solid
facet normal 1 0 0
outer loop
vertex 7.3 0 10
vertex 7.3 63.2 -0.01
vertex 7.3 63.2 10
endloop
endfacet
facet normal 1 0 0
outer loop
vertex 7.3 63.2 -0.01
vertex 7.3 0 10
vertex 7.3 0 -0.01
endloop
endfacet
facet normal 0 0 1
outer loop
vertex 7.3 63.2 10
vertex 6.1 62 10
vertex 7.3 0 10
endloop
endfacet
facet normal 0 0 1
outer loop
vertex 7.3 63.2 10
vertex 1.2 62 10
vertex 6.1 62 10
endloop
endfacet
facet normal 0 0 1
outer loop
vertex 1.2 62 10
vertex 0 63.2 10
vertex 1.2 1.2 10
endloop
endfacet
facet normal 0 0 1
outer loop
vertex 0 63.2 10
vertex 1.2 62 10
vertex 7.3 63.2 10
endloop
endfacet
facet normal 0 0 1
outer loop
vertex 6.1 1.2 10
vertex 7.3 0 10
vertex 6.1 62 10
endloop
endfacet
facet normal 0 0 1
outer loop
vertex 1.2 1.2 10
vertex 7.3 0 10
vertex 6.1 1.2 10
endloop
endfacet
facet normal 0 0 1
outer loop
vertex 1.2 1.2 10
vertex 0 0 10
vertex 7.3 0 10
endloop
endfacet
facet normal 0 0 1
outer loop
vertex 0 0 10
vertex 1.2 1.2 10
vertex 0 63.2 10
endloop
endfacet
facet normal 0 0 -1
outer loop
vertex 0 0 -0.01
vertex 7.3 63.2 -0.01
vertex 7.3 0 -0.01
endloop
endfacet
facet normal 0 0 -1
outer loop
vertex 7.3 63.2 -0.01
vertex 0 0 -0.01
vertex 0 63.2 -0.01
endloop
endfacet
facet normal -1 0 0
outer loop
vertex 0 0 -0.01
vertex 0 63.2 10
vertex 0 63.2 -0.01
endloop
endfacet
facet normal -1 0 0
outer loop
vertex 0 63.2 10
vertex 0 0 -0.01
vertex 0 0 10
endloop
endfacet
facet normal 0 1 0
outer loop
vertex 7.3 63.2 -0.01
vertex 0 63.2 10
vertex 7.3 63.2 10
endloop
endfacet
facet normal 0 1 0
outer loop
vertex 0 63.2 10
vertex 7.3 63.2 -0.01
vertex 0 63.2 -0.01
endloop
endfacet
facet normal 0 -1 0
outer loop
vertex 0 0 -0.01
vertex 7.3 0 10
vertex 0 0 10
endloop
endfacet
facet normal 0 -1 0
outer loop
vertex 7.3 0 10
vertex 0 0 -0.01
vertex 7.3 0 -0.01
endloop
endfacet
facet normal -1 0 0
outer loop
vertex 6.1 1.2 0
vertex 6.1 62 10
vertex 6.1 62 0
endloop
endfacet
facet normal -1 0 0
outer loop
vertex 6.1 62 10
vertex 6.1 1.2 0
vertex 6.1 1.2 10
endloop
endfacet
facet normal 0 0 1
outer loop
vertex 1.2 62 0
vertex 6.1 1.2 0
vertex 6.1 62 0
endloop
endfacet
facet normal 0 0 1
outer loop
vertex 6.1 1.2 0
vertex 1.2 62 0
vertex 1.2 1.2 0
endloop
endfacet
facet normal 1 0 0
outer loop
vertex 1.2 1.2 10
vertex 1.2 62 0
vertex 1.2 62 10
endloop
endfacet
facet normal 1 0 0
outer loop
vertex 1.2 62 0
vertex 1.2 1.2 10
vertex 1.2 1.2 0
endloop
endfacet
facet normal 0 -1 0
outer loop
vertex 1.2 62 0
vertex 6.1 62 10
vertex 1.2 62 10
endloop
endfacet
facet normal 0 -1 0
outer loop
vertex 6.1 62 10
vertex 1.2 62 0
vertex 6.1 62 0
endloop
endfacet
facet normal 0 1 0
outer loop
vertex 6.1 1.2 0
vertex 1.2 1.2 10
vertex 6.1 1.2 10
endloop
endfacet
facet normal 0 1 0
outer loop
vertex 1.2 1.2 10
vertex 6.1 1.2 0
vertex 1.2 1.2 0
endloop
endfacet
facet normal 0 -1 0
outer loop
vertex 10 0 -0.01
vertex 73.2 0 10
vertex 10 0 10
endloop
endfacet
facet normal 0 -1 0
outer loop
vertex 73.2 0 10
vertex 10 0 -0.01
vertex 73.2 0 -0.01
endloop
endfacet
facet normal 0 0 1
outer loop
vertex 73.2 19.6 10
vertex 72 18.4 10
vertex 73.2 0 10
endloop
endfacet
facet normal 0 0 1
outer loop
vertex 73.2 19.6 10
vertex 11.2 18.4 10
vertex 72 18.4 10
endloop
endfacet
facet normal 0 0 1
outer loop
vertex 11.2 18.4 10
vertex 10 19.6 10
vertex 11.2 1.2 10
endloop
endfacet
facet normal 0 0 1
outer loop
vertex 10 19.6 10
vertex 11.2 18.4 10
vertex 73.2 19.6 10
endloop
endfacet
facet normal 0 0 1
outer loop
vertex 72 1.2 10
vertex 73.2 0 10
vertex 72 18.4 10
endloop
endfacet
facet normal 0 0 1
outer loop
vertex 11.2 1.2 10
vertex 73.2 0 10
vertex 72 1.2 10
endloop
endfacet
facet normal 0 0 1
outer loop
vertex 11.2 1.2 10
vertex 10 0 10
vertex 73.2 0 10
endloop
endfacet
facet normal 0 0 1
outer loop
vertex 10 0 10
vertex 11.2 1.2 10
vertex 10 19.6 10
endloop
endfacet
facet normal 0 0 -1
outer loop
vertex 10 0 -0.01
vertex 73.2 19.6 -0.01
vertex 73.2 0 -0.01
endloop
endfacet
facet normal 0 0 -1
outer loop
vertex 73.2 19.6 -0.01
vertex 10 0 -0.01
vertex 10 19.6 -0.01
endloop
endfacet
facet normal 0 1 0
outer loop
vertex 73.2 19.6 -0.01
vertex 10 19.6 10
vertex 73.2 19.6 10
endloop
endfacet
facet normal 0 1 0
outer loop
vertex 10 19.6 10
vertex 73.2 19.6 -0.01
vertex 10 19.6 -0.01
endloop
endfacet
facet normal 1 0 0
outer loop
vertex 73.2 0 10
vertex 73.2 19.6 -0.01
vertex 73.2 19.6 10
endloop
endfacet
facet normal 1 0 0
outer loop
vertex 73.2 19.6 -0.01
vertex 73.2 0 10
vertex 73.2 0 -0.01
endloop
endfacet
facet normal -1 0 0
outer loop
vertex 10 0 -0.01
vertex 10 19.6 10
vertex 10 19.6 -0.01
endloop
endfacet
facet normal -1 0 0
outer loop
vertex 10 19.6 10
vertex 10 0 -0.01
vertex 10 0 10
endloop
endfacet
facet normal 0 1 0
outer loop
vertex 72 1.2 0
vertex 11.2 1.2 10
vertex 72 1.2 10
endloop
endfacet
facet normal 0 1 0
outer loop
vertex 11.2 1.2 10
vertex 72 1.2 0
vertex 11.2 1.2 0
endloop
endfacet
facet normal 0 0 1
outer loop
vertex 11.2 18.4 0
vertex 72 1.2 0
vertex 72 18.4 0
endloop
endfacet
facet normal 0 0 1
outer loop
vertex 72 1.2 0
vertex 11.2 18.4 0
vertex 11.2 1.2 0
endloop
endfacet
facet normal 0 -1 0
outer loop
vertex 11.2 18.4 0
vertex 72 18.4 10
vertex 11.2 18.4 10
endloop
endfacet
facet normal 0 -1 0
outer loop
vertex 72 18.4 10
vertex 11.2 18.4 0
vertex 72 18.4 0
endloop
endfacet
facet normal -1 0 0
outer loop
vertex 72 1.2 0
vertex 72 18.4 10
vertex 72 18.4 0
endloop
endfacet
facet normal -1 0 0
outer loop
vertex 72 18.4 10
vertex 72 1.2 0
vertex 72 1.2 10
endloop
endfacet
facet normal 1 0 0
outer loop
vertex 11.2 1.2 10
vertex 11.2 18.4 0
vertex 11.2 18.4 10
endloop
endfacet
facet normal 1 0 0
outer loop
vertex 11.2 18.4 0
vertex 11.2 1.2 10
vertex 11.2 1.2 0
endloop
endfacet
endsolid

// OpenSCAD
// file: ../../Base/Boxes.scad
// Fischertechnik Box Foundation
// Pre-designed Boxes

use <Constants.scad>

include <PlacementOptions.scad>

box190Width = 190;
box190Depth = 130;
box130Width = 130;
box130Depth = 95;
boxUsageHeight = 33.9;
boxWallThickness = 2.4;
boxBaseThickness = 1.0;

// getBoxWallThickness()
// Gets the wall thickness of a Fischertechnik Box

function getBoxWallThickness() = boxWallThickness;

// Gets the usable height of a fischertechnik box
function getBoxUsageHeight() = boxUsageHeight;

// Gets the thickness of the Fischertechnik box base.
function getBoxBaseThickness() = boxBaseThickness;

// Gets the usable inner space of a Box 190 as an x/y-list
function getBox190Space() = [
    box190Width - 2*getBoxWallThickness(), 
    box190Depth - 2*getBoxWallThickness() ];

// Imports the Fischertechnik empty box 130x190 mm and places it at position 0,0
// 190x130 are the outer sizes, the inner space is slightly smaller. Use getBox190Space() to get the inner sizes.
// This module needs the STL file "Fischertechnik Box 130x190.stl" in the library path.
// The box is positioned that the usable inner space is at the 0,0,0 position. The

module Box190() {
    translate([-getBoxWallThickness(),-getBoxWallThickness(),-getBoxBaseThickness()])
        import("Fischertechnik Box 130x190.stl", convexity=3);
}

// Gets the usable inner space of a Box 130 as an x/y-list
function getBox130Space() = [
    box130Width - 2*getBoxWallThickness(), 
    box130Depth - 2*getBoxWallThickness() ];

// Imports the Fischertechnik empty box 95x130 mm and places it at position 0,0
// 190x130 are the outer sizes, the inner space is slightly smaller. Use getBox190Space() to get the inner sizes.
// This module needs the STL file "Fischertechnik Box 95x130.stl" in the library path.
// The box is positioned that the usable inner space is at the 0,0,0 position. The

module Box130() {
    translate([-getBoxWallThickness(),-getBoxWallThickness(),-getBoxBaseThickness()])
        import("Fischertechnik Box 95x130.stl", convexity=3);
}

// Creates a web at the specified box walls
// corner 0 = LowerLeft, 1 = UpperLeft, 2 = UpperRight, 3 = LowerRight
// side 0 = LeftOfCorner, 1 = RightOfCorner
// distance = Distance in mm from the corner
// box = inner width and depth of the box (default: Box 190)
// webWidth = length of the web (default is 3 mms)
// webThickness = thickness of the web (default is 1 mm)

module BoxWeb(corner, side, distance, box=getBox190Space(), webWidth=3, webThickness=1.0) {
    sink = getBoxWallThickness()/2;

    width = (corner % 2 == 0) ? 
            (side == LeftOfCorner ? webWidth : webThickness) :
            (side == LeftOfCorner ? webThickness : webWidth);

    depth = (corner % 2 == 0) ? 
            (side == RightOfCorner ? webWidth : webThickness) :
            (side == RightOfCorner ? webThickness : webWidth);
    
    xDiff = corner == LowerLeft ? 
                (side == LeftOfCorner ? -sink : distance) :
            (corner == UpperLeft ?                
                (side == LeftOfCorner ? distance : -sink) :
            (corner == UpperRight ?
                (side == LeftOfCorner ? box.x-webWidth+sink : box.x-distance-webThickness) :
                (side == LeftOfCorner ? box.x-distance-webThickness: box.x-webWidth+sink)));

    yDiff = corner == LowerLeft ? 
                (side == RightOfCorner ? -sink : distance) :
            (corner == UpperLeft ?
                (side == RightOfCorner ? box.y-distance : box.y-webWidth+sink) :
            (corner == UpperRight ?
                (side == RightOfCorner ? box.y-webWidth+sink : box.y-distance) :
                (side == RightOfCorner ? distance : -sink)));
    
    translate([xDiff, yDiff, -getExcess()])
        cube([width, depth, boxUsageHeight + 2*getExcess()]);
}
// file: ../../Base/Rotation.scad
// Fischertechnik Box Foundation
// Geometry Helpers Rotation

include <PlacementOptions.scad>

// getRotatedSpace(space, rotation=NoRotation)
// Rotates the space dependent on the specified rotation

function getRotatedSpace(space, rotation=NoRotation) = [
    (rotation == Rotate90 || rotation == Rotate270) ? space.y : space.x,
    (rotation == Rotate90 || rotation == Rotate270) ? space.x : space.y
];

// Rotates the given space around the fixed left lower corner
// space = the space the children needs as width/depth list [width,depth]
// rotation = 0 Rotate0 degrees, 1 Rotate90 degrees, 2 Rotate180 degrees, 3 Rotate270 degrees (equivalent to -90)

module RotateFix(space, rotation=Rotate0) {
    dy = (rotation == Rotate0 || rotation == Rotate270) ? 0 :
        (rotation == Rotate90) ? space.x :
        space.y;
    dx = (rotation < Rotate180) ? 0 :
        (rotation == Rotate180) ? space.x :
        space.y;
    
    translate([dx, dy, 0])
        rotate([0, 0, rotations[rotation]])
            children();
}
// file: ../../Base/Alignment.scad
// Fischertechnik Box Foundation
// Geometry Helpers Alignment

include <PlacementOptions.scad>

// getAlignedX(elementWidth, spaceWidth, align=AlignRight, offset=0)
// Gets the aligned X offset of an element with the given
// width in the given space.
// elementWidth = The width of the element to positon
// spaceWidth = The space where the element should be aligned
// align = 0 AlignLeft, 1 AlignCenter, 2 AlignRight
// offset = an optional offset from the aligned position. When
// aligned left or centered, then positive values are in X direction.
// When aligned right then positive values are in negative X direction.

function getAlignedX(elementWidth, spaceWidth, align=AlignRight, offset=0) =
    (align == AlignLeft) ?
        offset :
        ((align == AlignCenter) ?
        (spaceWidth - elementWidth)/2 + offset :
        spaceWidth - offset - elementWidth);

// getAlignedY(elementDepth, spaceDepth, align=AlignTop, offset=0)
// Gets the aligned Y offset of an element with the given
// depth in the given space.
// elementDepth = The depth of the element to positon
// spaceDepth = The space where the element should be aligned
// align = 0 AlignBottom, 1 AlignCenter, 2 AlignTop
// offset = an optional offset from the aligned position. When
// aligned bottom or centered, then positive values are in Y direction.
// When aligned top then positive values are in negative Y direction.

function getAlignedY(elementDepth, spaceDepth, align=AlignTop, offset=0) =
    (align == AlignBottom) ?
        offset :
        ((align == AlignCenter) ?
        (spaceDepth - elementDepth)/2 + offset :
        spaceDepth - offset - elementDepth);
// file: ../../Base/Constants.scad
// Fischertechnik Box Foundation
// Constants

// Constant values necessary for multiple elements

// Base constants
dividerThickness = 1.2;
excess = 0.01;
fragments = 90;
tolerance = 0.8;

// Gets the thickness of a divider 
function getDividerThickness() = dividerThickness;

// Gets the excess that is used to merge walls into each other
function getExcess() = excess;

// Gets amount of fragments of a cylinder
function getFragments() = fragments;

// Gets the inner tolerance of a frame to each side
function getTolerance() = tolerance;


// Fischertechnik specific constants
axisDiameter = 4;
axisBottomDiameter = axisDiameter + 1;
standardEdgeDistance = 2.5;
standardWebDistance = 11.5;
standardCornerLength = 15;
tubeWallFactor = 1.6;

// Gets axis diameter
function getAxisDiameter() = axisDiameter;

// Gets axis bottom diameter for thicker part at the bottom
function getAxisBottomDiameter() = axisBottomDiameter;

// gets the standard distance to the wall of the box for dockable frames with webs
function getStandardEdgeDistance() = standardEdgeDistance;

// gets the standard distance of each web to the corner of the dockable frame
function getStandardWebDistance() = standardWebDistance;

// gets the standard length of the corner walls of a dockable frame
function getStandardCornerLength() = standardCornerLength;

// gets the wall thickness of a tube.
function getTubeWallThickness() = tubeWallFactor * getDividerThickness();
// file: ../../Base/PlacementOptions.scad
// Fischertechnik Box Foundation
// Placement Options

// Alignment
NoAlign = 0;
AlignLeft = 1;
AlignBottom = 2;
AlignCenter = 3;
AlignRight = 4;
AlignTop = 5;

// Element rotation degree steps
rotations = [0, -90, -180, -270];

// Rotation
NoRotation = 0;
Rotate0 = 0;
Rotate90 = 1;
Rotate180 = 2;
Rotate270 = 3;

// Docking (seen from above)
NoDock = -1;
DockLeft = 0;
DockTop = 1;
DockRight = 2;
DockCorner = 2;
DockBottom = 3;

// Web corners
LowerLeft = 0;
UpperLeft = 1;
UpperRight = 2;
LowerRight = 3;

// Web position relative to corner
LeftOfCorner = 0;
RightOfCorner = 1;
// file: ../../Elements/FrameFlatPiece60.scad
// Fischertechnik Box Library
// Frame for Flat Pieces 60
// 31555

use <../Base/Constants.scad>
use <../ModelBase/Complex.scad>

size = 60;

// getFrameFlatPiece60Space(count)
// count = count of pieces in X direction
// Gets the space for a frame for flat pieces 60.

function getFrameFlatPiece60Space(count=1) = getFrameFlatPieceVolume(count, size);

// FrameFlatPiece30(count)
// count = Count of flat pieces 60 in X direction

module FrameFlatPiece60(count=1) {  
    FrameFlatPiece(count, size);
}

// Tests
color("lightgray") {
FrameFlatPiece60(2);
}
// file: ../../Base/Placement.scad
// Fischertechnik Box Foundation
// Geometry Helpers Placement

use <Constants.scad>
use <Alignment.scad>
use <Rotation.scad>
use <Boxes.scad>

include <PlacementOptions.scad>

// Place(x=0, y=0, elementSpace=[0,0], alignX=AlignLeft, alignY=AlignBottom, rotation=Rotate0, boxSpace=getBox190Space())
// Places the child at the specified position
// y = Y-Position. This is a relative position when an X aligment is specified.
// x = X-Position. This is a relative position when an Y aligment is specified.
// elementSpace = space of the element to be placed [x,y]
// alignX = -1=NoAlign, 0 AlignLeft, 1 AlignCenter, 3 AlignRight (elementSpace and boxSpace required!)
// alignY = -1=NoAlign, 2 AlignBottom, 1 AlignCenter, 4 AlignTop (elementSpace and boxSpace required!)
// rotation = 0 Rotate0 0 degrees, 1 Rotate90 90 degrees, 
// 2 Rotate180 180 degrees, 3 Rotate270 270 degrees (equivalent to -90)
// boxSpace = Inner space of the box where the placement occurs [x,y] - default is Box 190x130 inner space

module Place(x=0, y=0, elementSpace=[0,0], 
  alignX=AlignLeft, alignY=AlignBottom, 
  rotation=NoRotation, boxSpace=getBox190Space()) {

    module Position(x, y, space, rotation=Rotate0) {
        translate([x, y, 0])
            RotateFix(space, rotation)
                children(0);
    }

    space = getRotatedSpace(elementSpace, rotation);
    alignedX = getAlignedX(space.x, boxSpace.x, alignX, x);
    alignedY = getAlignedY(space.y, boxSpace.y, alignY, y);
    Position(alignedX, alignedY, elementSpace, rotation)
        children(0);
}

// Center(space=getBox130Space(), elementSpace=[0,0])
// space = Space where the children is centered. For cylinder use centered=true and no elementSpace.
// elementSpace = space of the element to be centered [x,y]

module Center(space=getBox190Space(), elementSpace=[0,0]) {
    translate([(space.x - elementSpace.x) / 2, (space.y - elementSpace.y) / 2])
        children(0);
}

// CenterHorizontal(width=0, y=0, offset=0, space=getBox130Space())
// space = Space where the children is centered. For cylinder use centered=true and no elementSpace.
// elementSpace = space of the element to be centered [x,y]

module CenterHorizontal(width=0, y=0, offset=0, space=getBox190Space()) {
    translate([(space.x - width) / 2 + offset, y])
        children(0);
}

// CenterVertical(depth=0, x=0, offset=0, space=getBox130Space())
// space = Space where the children is centered. For cylinder use centered=true and no elementSpace.
// elementSpace = space of the element to be centered [x,y]

module CenterVerticalal(depth=0, x=0, offset=0, space=getBox190Space()) {
    translate([x, (space.y - depth) / 2 + offset])
        children(0);
}
// main file
// Fischertechnik Box Foundation
// Elements
// Test FrameFlatPiece60

use <../../Base/Placement.scad>
use <../../Elements/FrameFlatPiece60.scad>

include <../../Base/PlacementOptions.scad>

FrameFlatPiece60();

Place(10, 0, elementSpace=getFrameFlatPiece60Space(4), rotation=Rotate90)
    FrameFlatPiece60(4);
